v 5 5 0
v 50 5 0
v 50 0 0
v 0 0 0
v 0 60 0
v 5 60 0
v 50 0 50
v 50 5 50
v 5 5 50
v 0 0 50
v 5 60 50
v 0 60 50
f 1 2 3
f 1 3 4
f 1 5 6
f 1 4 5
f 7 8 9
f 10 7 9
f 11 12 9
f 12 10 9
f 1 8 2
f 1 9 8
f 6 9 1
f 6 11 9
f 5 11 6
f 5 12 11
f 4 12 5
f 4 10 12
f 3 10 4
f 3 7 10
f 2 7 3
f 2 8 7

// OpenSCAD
$fn = 32;

// ----------------------------------------------------------------------
// Structural section: angle 50 x 60 mm
// ----------------------------------------------------------------------

// --- parameters (mm) ---
sec_w = 50;               // leg width, X
sec_h = 60;               // leg height, Y
flange_t = 5;             // leg thickness
plate_t = 50;             // cut length, Z (extrusion height)

profile = [[0, 0], [50, 0], [50, 5], [5, 5], [5, 60], [0, 60]];  // primary outline, 6 points, counter clockwise

// --- the one profile operation ---
linear_extrude(height = plate_t) polygon(points = profile);
